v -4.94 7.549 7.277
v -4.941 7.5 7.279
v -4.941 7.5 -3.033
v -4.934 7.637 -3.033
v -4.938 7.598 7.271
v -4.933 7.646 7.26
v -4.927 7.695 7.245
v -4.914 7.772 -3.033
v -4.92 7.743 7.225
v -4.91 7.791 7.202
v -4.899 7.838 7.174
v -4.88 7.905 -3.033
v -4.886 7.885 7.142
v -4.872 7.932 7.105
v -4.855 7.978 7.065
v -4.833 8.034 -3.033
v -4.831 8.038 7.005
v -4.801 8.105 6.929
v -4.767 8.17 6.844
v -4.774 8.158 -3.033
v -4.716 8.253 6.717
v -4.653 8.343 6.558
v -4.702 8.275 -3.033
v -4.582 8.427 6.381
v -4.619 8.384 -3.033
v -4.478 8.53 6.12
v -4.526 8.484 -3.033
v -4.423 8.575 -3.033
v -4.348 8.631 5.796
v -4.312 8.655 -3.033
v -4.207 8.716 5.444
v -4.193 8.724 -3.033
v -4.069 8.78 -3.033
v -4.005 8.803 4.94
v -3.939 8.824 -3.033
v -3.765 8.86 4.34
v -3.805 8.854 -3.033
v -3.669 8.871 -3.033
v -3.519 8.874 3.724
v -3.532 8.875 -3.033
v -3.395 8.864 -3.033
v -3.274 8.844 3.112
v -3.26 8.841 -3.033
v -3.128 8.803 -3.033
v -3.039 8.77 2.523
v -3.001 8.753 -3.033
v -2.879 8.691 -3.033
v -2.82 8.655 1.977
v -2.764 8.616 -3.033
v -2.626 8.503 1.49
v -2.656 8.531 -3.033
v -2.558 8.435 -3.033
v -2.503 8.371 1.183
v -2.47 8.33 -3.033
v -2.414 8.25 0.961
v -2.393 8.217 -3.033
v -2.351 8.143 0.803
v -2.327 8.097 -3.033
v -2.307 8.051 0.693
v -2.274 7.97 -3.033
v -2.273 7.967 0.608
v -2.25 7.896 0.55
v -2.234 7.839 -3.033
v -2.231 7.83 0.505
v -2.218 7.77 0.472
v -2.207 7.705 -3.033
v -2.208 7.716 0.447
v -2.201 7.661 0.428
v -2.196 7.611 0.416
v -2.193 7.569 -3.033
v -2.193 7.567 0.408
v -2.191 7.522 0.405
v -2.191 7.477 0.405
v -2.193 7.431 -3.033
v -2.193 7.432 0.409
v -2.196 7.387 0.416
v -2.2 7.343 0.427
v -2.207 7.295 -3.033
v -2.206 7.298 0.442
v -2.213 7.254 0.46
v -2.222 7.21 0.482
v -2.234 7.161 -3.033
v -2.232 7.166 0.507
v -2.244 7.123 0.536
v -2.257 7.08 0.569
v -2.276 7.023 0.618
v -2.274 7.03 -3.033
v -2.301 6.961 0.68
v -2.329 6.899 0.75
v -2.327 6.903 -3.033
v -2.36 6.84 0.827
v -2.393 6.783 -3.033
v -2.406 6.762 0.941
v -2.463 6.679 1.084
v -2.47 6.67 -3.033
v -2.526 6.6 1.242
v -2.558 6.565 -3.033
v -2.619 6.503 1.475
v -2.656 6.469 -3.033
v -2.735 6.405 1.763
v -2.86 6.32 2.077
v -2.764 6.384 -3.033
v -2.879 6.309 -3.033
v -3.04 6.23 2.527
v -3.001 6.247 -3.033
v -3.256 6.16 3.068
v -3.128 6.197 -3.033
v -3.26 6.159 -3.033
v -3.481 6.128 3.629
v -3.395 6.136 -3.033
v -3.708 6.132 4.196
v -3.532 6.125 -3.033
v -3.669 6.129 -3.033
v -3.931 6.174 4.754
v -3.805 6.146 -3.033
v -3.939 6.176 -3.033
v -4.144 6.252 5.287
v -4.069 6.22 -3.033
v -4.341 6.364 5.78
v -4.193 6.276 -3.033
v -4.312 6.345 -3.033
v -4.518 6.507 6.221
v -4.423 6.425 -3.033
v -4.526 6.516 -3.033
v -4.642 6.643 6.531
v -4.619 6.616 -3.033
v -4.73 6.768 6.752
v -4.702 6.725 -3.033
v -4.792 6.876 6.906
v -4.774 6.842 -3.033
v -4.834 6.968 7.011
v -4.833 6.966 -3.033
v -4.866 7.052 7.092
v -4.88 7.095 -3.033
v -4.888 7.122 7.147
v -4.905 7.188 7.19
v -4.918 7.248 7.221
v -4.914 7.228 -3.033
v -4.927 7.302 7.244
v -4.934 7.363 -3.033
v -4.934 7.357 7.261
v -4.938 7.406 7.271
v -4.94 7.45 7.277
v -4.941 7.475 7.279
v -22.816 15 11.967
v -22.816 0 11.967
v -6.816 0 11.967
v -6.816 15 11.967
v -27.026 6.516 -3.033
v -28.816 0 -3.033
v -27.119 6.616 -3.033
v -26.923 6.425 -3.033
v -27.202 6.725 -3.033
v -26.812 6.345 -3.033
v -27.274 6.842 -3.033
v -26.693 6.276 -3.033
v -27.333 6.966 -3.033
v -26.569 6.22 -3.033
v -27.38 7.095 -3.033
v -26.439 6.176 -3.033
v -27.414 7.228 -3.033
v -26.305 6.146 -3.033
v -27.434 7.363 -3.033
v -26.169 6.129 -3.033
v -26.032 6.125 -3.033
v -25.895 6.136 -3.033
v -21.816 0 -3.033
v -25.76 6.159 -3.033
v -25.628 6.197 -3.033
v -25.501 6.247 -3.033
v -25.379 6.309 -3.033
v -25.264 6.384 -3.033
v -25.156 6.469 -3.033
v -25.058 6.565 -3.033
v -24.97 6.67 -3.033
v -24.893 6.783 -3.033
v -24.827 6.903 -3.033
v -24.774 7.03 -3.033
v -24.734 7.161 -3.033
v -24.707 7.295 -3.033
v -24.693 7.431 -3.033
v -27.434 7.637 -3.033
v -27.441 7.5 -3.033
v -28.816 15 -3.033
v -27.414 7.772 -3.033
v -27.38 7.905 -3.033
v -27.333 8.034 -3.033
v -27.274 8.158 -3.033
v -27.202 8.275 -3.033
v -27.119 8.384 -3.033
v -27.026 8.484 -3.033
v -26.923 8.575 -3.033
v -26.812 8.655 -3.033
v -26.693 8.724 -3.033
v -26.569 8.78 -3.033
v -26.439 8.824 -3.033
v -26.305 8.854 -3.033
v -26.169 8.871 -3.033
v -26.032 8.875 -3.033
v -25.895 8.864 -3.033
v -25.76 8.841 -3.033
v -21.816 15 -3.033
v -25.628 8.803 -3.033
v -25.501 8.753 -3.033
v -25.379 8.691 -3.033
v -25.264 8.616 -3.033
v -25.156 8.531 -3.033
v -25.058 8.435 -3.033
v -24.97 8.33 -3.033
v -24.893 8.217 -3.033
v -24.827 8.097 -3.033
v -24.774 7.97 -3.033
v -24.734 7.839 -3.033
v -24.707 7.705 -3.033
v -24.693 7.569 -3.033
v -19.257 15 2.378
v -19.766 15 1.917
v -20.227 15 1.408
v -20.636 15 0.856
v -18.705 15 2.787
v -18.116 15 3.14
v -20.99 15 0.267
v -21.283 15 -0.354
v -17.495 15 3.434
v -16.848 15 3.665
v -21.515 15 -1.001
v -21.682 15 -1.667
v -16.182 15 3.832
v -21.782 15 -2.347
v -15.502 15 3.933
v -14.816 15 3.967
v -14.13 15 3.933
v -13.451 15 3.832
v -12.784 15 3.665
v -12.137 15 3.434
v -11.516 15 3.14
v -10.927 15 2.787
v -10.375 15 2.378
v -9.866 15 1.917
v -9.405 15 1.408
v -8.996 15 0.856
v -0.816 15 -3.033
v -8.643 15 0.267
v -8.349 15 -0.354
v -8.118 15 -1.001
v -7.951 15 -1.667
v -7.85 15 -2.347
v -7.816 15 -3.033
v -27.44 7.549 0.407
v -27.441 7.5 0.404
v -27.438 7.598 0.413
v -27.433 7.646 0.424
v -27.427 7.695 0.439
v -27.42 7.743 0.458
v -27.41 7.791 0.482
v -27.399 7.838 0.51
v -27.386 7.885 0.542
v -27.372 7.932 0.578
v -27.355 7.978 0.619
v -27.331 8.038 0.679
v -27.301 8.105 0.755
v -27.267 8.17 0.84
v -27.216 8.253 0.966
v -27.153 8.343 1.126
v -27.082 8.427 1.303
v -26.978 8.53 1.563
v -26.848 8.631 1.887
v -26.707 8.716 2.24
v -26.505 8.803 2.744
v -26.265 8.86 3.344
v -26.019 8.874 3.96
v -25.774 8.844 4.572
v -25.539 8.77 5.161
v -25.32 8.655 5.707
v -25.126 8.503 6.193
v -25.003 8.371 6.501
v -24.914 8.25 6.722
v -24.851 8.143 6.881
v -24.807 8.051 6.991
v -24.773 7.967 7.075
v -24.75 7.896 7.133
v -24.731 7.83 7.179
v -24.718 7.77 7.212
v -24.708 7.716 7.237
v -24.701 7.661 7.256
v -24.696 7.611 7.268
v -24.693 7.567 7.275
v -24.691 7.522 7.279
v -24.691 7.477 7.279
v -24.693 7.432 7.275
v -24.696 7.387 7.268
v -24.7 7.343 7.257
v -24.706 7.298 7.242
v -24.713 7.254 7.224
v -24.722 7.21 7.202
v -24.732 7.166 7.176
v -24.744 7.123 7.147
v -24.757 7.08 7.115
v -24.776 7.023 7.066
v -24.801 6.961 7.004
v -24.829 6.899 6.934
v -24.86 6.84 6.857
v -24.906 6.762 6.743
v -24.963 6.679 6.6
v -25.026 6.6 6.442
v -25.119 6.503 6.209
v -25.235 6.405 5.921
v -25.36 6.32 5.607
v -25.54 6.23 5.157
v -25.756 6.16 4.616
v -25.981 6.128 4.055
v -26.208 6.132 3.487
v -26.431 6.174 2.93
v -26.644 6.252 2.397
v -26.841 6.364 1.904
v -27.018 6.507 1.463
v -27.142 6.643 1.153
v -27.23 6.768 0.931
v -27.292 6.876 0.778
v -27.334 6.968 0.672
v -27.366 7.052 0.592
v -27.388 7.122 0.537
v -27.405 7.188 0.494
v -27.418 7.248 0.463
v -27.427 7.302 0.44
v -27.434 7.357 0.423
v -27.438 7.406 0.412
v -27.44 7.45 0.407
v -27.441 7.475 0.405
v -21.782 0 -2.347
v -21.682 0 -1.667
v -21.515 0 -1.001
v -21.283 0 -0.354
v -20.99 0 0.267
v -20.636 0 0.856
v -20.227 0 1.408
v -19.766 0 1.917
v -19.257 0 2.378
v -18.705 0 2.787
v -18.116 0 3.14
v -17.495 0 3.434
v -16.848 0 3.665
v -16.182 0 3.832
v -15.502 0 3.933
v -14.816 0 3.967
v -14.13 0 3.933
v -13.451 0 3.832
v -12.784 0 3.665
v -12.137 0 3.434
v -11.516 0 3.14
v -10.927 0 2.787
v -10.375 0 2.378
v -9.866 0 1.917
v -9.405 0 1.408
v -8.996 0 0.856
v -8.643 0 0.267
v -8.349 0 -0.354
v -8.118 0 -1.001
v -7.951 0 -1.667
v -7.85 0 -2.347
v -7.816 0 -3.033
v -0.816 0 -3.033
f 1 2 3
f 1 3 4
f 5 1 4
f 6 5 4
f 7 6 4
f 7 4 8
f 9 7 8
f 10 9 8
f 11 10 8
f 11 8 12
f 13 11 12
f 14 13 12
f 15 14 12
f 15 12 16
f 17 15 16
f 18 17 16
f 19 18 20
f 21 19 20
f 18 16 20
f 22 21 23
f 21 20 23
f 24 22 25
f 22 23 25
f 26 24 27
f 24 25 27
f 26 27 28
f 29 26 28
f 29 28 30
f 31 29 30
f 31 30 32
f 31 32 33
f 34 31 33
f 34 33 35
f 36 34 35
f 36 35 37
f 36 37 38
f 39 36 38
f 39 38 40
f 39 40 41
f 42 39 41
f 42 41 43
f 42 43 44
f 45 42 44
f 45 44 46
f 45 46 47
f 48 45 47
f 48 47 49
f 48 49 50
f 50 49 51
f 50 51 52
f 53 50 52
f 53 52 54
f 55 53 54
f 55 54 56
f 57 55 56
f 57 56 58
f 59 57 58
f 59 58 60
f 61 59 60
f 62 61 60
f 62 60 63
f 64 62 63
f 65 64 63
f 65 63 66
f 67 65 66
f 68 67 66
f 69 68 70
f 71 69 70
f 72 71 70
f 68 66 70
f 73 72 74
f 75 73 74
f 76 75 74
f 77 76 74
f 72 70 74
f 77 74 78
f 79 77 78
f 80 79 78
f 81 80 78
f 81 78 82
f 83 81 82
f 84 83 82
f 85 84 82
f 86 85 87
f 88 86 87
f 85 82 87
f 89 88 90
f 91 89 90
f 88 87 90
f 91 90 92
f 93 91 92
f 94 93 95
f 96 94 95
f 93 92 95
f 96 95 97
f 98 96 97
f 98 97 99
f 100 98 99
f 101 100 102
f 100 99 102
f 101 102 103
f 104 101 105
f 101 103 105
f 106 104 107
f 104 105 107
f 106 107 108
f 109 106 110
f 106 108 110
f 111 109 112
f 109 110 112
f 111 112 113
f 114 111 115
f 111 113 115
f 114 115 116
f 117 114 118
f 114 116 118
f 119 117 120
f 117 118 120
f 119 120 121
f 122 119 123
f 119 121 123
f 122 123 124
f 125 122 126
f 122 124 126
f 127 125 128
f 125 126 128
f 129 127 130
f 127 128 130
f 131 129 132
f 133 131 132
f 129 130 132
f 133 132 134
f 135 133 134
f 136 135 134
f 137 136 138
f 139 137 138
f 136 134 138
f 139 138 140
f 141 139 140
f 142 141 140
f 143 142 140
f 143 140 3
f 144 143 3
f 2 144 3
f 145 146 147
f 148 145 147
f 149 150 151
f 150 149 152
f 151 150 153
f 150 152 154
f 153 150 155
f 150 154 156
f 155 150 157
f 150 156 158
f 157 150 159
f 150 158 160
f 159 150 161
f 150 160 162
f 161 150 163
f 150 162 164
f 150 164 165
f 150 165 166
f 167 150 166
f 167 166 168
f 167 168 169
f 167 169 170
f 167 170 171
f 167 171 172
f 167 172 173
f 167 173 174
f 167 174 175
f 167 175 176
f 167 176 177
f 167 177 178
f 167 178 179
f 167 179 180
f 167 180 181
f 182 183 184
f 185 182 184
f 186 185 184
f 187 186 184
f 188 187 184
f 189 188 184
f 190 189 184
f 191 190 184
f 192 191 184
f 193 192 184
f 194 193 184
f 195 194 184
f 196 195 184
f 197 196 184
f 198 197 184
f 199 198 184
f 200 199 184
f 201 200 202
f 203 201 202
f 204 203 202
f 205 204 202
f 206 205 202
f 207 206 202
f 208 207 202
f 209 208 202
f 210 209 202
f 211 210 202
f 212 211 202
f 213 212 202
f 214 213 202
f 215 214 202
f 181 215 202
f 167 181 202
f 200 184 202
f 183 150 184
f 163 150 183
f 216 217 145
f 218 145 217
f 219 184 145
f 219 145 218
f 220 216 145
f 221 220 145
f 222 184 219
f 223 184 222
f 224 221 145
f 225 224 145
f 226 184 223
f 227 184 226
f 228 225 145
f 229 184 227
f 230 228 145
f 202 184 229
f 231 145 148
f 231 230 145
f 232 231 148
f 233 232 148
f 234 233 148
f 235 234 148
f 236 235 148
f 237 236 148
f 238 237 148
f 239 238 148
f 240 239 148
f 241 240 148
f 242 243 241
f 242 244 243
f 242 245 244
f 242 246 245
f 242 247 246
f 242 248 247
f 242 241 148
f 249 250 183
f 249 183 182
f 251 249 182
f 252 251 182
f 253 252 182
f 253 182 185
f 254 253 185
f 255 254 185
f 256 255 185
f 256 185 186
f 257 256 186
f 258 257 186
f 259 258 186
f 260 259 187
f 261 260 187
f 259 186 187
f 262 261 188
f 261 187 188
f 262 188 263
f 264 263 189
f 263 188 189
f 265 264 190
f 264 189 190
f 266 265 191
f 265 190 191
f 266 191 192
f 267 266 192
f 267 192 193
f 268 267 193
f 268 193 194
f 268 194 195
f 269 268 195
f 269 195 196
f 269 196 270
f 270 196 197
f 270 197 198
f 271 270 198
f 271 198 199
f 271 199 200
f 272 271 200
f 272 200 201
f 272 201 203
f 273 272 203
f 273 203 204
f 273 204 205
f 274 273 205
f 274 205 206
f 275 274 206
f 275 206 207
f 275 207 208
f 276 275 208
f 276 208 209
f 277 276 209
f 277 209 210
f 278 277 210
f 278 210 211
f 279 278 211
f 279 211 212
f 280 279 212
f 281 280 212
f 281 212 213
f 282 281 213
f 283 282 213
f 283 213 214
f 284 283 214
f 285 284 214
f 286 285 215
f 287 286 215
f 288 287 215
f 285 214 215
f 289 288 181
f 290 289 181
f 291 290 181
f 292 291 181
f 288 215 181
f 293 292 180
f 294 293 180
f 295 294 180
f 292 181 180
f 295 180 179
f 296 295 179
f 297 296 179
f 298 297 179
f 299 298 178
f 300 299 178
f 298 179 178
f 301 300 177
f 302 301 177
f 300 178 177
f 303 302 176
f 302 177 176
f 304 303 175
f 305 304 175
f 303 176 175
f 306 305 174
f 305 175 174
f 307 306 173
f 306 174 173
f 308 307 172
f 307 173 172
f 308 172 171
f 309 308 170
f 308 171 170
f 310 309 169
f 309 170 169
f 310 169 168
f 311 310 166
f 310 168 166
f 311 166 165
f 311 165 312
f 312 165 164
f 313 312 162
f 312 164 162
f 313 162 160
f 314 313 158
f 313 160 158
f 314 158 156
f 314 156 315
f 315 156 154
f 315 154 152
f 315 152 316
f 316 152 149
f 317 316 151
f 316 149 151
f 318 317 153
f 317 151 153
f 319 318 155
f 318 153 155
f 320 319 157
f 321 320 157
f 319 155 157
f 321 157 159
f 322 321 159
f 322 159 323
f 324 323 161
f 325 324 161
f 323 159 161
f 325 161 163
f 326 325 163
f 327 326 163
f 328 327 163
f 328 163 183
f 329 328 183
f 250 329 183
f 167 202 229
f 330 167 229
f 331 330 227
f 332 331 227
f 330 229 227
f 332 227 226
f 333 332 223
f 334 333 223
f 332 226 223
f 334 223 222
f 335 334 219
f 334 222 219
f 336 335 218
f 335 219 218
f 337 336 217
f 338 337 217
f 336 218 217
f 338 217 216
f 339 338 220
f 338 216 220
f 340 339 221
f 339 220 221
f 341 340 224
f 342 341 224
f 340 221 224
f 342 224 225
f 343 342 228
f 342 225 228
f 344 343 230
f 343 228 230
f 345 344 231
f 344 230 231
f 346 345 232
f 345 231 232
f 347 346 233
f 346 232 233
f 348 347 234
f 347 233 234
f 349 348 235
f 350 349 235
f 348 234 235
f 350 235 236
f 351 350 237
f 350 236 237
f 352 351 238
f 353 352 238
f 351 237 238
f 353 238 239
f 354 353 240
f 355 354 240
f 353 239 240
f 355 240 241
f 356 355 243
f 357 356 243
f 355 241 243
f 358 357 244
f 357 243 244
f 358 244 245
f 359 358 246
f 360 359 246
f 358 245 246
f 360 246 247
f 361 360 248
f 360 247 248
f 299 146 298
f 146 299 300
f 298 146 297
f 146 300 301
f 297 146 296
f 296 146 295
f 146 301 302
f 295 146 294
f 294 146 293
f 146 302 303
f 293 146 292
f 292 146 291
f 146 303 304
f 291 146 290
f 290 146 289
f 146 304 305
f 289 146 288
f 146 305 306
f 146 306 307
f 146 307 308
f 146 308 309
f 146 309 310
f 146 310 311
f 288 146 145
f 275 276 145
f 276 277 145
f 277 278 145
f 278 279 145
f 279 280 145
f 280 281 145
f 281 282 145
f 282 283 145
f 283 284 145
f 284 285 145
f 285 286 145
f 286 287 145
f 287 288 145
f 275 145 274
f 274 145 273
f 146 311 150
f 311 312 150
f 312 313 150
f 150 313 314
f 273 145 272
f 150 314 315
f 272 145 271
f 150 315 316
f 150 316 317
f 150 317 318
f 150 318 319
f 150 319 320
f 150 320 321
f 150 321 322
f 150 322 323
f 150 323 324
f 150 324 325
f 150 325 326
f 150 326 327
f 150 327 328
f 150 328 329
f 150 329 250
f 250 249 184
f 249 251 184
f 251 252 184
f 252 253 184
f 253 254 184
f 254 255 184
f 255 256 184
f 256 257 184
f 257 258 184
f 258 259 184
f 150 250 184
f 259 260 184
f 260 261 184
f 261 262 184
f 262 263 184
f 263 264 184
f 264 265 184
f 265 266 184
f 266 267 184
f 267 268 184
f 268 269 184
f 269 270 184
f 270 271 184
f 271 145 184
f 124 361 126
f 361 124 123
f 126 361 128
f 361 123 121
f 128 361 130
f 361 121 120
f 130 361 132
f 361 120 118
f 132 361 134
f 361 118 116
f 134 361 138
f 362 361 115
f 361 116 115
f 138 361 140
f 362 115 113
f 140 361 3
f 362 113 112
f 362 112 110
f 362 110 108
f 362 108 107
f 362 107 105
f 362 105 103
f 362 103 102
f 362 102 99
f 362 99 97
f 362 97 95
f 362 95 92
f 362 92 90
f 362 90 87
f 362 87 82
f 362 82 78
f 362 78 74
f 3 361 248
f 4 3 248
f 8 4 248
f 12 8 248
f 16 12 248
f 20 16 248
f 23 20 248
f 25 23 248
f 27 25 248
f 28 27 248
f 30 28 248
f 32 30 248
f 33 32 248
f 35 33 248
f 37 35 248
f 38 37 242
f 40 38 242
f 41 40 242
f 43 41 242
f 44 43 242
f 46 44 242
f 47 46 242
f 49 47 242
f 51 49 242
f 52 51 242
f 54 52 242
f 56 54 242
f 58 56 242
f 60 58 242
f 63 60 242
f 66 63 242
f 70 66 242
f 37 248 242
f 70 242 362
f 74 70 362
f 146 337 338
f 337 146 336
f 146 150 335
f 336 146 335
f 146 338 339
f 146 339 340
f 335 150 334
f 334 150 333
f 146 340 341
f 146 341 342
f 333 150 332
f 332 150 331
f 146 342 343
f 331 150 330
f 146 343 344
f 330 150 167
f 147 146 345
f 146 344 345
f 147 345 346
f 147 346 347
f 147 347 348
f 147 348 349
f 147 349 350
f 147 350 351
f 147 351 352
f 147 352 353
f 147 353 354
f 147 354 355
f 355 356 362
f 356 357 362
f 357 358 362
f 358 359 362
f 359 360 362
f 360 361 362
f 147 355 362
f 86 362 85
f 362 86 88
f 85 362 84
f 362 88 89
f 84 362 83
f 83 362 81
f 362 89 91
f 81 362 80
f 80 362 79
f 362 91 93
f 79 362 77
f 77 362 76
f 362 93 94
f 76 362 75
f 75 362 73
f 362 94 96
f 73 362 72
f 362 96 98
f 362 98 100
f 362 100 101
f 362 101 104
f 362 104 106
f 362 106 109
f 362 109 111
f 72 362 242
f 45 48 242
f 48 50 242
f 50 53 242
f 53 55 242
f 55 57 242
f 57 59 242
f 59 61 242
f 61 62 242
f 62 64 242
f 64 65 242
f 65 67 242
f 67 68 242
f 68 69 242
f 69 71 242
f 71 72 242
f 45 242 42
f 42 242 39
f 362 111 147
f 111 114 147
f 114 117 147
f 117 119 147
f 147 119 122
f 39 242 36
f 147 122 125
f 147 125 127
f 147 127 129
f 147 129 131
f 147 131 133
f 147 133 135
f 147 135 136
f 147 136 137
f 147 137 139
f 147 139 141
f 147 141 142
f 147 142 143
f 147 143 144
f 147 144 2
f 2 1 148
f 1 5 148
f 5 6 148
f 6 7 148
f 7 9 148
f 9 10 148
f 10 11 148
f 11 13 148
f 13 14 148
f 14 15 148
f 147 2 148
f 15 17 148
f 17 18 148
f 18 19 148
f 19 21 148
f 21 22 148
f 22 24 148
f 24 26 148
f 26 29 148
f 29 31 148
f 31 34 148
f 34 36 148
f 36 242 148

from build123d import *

# Parameters (mm, degrees)
SKETCH1_W           = 40
SKETCH1_H           = 30
BOSS_EXTRUDE1_DEPTH = 15
CUT_EXTRUDE1_DEPTH  = 15
SKETCH3_R           = 1.375
CUT_EXTRUDE2_DEPTH  = 15


with BuildPart() as part:
    # Sketch1 → Boss-Extrude1 (new body)
    with BuildSketch(Plane(origin=(0, 0, 0), x_dir=(1, 0, 0), z_dir=(0, 1, 0))):
        with Locations((-14.816176471, 3.033088235)):
            Rectangle(SKETCH1_W, SKETCH1_H)
    extrude(amount=BOSS_EXTRUDE1_DEPTH)

    # Sketch2 → Cut-Extrude1 (cut)
    with BuildSketch(Plane(origin=(0, 15, 0), x_dir=(1, 0, 0), z_dir=(0, 1, 0))):
        Polygon((-28.816176471, 3.033088235), (-28.816176471, 18.033088235), (-34.816176471, 18.033088235), align=None)
        with BuildLine():
            Line((-0.816176471, 18.033088235), (-28.816176471, 18.033088235))
            Line((-28.816176471, 18.033088235), (-28.816176471, 3.033088235))
            Line((-28.816176471, 3.033088235), (-21.816176471, 3.033088235))
            ThreePointArc((-21.816176471, 3.033088235), (-14.816176471, 10.033088235), (-7.816176471, 3.033088235))
            Line((-7.816176471, 3.033088235), (-0.816176471, 3.033088235))
            Line((-0.816176471, 3.033088235), (-0.816176471, 18.033088235))
        make_face()
        Polygon((5.183823529, 18.033088235), (-0.816176471, 18.033088235), (-0.816176471, 3.033088235), align=None)
        Polygon((5.183823529, 18.033088235), (-0.816176471, 3.033088235), (-0.816176471, -11.966911765), (5.183823529, -11.966911765), align=None)
        Polygon((-0.816176471, -11.966911765), (-0.816176471, 3.033088235), (-6.816176471, -11.966911765), align=None)
        Polygon((-22.816176471, -11.966911765), (-28.816176471, 3.033088235), (-28.816176471, -11.966911765), align=None)
        Polygon((-28.816176471, -11.966911765), (-28.816176471, 3.033088235), (-34.816176471, 18.033088235), (-34.816176471, -11.966911765), align=None)
        with BuildLine():
            ThreePointArc((-7.816176471, 3.033088235), (-14.816176471, 10.033088235), (-21.816176471, 3.033088235))
            Line((-21.816176471, 3.033088235), (-7.816176471, 3.033088235))
        make_face()
        with BuildLine():
            Line((-7.816176471, 3.033088235), (-21.816176471, 3.033088235))
            ThreePointArc((-21.816176471, 3.033088235), (-14.816176471, -3.966911765), (-7.816176471, 3.033088235))
        make_face()
    extrude(amount=-CUT_EXTRUDE1_DEPTH, mode=Mode.SUBTRACT)

    # Sketch3 → Cut-Extrude2 (cut)
    with BuildSketch(Plane(origin=(0, 0, -3.033088235), x_dir=(-1, 0, 0), z_dir=(0, 0, -1))):
        with Locations((3.566176471, 7.5)):
            Circle(SKETCH3_R)
        with Locations((26.066176471, 7.5)):
            Circle(SKETCH3_R)
    extrude(amount=-CUT_EXTRUDE2_DEPTH, mode=Mode.SUBTRACT)


solid = part.part
